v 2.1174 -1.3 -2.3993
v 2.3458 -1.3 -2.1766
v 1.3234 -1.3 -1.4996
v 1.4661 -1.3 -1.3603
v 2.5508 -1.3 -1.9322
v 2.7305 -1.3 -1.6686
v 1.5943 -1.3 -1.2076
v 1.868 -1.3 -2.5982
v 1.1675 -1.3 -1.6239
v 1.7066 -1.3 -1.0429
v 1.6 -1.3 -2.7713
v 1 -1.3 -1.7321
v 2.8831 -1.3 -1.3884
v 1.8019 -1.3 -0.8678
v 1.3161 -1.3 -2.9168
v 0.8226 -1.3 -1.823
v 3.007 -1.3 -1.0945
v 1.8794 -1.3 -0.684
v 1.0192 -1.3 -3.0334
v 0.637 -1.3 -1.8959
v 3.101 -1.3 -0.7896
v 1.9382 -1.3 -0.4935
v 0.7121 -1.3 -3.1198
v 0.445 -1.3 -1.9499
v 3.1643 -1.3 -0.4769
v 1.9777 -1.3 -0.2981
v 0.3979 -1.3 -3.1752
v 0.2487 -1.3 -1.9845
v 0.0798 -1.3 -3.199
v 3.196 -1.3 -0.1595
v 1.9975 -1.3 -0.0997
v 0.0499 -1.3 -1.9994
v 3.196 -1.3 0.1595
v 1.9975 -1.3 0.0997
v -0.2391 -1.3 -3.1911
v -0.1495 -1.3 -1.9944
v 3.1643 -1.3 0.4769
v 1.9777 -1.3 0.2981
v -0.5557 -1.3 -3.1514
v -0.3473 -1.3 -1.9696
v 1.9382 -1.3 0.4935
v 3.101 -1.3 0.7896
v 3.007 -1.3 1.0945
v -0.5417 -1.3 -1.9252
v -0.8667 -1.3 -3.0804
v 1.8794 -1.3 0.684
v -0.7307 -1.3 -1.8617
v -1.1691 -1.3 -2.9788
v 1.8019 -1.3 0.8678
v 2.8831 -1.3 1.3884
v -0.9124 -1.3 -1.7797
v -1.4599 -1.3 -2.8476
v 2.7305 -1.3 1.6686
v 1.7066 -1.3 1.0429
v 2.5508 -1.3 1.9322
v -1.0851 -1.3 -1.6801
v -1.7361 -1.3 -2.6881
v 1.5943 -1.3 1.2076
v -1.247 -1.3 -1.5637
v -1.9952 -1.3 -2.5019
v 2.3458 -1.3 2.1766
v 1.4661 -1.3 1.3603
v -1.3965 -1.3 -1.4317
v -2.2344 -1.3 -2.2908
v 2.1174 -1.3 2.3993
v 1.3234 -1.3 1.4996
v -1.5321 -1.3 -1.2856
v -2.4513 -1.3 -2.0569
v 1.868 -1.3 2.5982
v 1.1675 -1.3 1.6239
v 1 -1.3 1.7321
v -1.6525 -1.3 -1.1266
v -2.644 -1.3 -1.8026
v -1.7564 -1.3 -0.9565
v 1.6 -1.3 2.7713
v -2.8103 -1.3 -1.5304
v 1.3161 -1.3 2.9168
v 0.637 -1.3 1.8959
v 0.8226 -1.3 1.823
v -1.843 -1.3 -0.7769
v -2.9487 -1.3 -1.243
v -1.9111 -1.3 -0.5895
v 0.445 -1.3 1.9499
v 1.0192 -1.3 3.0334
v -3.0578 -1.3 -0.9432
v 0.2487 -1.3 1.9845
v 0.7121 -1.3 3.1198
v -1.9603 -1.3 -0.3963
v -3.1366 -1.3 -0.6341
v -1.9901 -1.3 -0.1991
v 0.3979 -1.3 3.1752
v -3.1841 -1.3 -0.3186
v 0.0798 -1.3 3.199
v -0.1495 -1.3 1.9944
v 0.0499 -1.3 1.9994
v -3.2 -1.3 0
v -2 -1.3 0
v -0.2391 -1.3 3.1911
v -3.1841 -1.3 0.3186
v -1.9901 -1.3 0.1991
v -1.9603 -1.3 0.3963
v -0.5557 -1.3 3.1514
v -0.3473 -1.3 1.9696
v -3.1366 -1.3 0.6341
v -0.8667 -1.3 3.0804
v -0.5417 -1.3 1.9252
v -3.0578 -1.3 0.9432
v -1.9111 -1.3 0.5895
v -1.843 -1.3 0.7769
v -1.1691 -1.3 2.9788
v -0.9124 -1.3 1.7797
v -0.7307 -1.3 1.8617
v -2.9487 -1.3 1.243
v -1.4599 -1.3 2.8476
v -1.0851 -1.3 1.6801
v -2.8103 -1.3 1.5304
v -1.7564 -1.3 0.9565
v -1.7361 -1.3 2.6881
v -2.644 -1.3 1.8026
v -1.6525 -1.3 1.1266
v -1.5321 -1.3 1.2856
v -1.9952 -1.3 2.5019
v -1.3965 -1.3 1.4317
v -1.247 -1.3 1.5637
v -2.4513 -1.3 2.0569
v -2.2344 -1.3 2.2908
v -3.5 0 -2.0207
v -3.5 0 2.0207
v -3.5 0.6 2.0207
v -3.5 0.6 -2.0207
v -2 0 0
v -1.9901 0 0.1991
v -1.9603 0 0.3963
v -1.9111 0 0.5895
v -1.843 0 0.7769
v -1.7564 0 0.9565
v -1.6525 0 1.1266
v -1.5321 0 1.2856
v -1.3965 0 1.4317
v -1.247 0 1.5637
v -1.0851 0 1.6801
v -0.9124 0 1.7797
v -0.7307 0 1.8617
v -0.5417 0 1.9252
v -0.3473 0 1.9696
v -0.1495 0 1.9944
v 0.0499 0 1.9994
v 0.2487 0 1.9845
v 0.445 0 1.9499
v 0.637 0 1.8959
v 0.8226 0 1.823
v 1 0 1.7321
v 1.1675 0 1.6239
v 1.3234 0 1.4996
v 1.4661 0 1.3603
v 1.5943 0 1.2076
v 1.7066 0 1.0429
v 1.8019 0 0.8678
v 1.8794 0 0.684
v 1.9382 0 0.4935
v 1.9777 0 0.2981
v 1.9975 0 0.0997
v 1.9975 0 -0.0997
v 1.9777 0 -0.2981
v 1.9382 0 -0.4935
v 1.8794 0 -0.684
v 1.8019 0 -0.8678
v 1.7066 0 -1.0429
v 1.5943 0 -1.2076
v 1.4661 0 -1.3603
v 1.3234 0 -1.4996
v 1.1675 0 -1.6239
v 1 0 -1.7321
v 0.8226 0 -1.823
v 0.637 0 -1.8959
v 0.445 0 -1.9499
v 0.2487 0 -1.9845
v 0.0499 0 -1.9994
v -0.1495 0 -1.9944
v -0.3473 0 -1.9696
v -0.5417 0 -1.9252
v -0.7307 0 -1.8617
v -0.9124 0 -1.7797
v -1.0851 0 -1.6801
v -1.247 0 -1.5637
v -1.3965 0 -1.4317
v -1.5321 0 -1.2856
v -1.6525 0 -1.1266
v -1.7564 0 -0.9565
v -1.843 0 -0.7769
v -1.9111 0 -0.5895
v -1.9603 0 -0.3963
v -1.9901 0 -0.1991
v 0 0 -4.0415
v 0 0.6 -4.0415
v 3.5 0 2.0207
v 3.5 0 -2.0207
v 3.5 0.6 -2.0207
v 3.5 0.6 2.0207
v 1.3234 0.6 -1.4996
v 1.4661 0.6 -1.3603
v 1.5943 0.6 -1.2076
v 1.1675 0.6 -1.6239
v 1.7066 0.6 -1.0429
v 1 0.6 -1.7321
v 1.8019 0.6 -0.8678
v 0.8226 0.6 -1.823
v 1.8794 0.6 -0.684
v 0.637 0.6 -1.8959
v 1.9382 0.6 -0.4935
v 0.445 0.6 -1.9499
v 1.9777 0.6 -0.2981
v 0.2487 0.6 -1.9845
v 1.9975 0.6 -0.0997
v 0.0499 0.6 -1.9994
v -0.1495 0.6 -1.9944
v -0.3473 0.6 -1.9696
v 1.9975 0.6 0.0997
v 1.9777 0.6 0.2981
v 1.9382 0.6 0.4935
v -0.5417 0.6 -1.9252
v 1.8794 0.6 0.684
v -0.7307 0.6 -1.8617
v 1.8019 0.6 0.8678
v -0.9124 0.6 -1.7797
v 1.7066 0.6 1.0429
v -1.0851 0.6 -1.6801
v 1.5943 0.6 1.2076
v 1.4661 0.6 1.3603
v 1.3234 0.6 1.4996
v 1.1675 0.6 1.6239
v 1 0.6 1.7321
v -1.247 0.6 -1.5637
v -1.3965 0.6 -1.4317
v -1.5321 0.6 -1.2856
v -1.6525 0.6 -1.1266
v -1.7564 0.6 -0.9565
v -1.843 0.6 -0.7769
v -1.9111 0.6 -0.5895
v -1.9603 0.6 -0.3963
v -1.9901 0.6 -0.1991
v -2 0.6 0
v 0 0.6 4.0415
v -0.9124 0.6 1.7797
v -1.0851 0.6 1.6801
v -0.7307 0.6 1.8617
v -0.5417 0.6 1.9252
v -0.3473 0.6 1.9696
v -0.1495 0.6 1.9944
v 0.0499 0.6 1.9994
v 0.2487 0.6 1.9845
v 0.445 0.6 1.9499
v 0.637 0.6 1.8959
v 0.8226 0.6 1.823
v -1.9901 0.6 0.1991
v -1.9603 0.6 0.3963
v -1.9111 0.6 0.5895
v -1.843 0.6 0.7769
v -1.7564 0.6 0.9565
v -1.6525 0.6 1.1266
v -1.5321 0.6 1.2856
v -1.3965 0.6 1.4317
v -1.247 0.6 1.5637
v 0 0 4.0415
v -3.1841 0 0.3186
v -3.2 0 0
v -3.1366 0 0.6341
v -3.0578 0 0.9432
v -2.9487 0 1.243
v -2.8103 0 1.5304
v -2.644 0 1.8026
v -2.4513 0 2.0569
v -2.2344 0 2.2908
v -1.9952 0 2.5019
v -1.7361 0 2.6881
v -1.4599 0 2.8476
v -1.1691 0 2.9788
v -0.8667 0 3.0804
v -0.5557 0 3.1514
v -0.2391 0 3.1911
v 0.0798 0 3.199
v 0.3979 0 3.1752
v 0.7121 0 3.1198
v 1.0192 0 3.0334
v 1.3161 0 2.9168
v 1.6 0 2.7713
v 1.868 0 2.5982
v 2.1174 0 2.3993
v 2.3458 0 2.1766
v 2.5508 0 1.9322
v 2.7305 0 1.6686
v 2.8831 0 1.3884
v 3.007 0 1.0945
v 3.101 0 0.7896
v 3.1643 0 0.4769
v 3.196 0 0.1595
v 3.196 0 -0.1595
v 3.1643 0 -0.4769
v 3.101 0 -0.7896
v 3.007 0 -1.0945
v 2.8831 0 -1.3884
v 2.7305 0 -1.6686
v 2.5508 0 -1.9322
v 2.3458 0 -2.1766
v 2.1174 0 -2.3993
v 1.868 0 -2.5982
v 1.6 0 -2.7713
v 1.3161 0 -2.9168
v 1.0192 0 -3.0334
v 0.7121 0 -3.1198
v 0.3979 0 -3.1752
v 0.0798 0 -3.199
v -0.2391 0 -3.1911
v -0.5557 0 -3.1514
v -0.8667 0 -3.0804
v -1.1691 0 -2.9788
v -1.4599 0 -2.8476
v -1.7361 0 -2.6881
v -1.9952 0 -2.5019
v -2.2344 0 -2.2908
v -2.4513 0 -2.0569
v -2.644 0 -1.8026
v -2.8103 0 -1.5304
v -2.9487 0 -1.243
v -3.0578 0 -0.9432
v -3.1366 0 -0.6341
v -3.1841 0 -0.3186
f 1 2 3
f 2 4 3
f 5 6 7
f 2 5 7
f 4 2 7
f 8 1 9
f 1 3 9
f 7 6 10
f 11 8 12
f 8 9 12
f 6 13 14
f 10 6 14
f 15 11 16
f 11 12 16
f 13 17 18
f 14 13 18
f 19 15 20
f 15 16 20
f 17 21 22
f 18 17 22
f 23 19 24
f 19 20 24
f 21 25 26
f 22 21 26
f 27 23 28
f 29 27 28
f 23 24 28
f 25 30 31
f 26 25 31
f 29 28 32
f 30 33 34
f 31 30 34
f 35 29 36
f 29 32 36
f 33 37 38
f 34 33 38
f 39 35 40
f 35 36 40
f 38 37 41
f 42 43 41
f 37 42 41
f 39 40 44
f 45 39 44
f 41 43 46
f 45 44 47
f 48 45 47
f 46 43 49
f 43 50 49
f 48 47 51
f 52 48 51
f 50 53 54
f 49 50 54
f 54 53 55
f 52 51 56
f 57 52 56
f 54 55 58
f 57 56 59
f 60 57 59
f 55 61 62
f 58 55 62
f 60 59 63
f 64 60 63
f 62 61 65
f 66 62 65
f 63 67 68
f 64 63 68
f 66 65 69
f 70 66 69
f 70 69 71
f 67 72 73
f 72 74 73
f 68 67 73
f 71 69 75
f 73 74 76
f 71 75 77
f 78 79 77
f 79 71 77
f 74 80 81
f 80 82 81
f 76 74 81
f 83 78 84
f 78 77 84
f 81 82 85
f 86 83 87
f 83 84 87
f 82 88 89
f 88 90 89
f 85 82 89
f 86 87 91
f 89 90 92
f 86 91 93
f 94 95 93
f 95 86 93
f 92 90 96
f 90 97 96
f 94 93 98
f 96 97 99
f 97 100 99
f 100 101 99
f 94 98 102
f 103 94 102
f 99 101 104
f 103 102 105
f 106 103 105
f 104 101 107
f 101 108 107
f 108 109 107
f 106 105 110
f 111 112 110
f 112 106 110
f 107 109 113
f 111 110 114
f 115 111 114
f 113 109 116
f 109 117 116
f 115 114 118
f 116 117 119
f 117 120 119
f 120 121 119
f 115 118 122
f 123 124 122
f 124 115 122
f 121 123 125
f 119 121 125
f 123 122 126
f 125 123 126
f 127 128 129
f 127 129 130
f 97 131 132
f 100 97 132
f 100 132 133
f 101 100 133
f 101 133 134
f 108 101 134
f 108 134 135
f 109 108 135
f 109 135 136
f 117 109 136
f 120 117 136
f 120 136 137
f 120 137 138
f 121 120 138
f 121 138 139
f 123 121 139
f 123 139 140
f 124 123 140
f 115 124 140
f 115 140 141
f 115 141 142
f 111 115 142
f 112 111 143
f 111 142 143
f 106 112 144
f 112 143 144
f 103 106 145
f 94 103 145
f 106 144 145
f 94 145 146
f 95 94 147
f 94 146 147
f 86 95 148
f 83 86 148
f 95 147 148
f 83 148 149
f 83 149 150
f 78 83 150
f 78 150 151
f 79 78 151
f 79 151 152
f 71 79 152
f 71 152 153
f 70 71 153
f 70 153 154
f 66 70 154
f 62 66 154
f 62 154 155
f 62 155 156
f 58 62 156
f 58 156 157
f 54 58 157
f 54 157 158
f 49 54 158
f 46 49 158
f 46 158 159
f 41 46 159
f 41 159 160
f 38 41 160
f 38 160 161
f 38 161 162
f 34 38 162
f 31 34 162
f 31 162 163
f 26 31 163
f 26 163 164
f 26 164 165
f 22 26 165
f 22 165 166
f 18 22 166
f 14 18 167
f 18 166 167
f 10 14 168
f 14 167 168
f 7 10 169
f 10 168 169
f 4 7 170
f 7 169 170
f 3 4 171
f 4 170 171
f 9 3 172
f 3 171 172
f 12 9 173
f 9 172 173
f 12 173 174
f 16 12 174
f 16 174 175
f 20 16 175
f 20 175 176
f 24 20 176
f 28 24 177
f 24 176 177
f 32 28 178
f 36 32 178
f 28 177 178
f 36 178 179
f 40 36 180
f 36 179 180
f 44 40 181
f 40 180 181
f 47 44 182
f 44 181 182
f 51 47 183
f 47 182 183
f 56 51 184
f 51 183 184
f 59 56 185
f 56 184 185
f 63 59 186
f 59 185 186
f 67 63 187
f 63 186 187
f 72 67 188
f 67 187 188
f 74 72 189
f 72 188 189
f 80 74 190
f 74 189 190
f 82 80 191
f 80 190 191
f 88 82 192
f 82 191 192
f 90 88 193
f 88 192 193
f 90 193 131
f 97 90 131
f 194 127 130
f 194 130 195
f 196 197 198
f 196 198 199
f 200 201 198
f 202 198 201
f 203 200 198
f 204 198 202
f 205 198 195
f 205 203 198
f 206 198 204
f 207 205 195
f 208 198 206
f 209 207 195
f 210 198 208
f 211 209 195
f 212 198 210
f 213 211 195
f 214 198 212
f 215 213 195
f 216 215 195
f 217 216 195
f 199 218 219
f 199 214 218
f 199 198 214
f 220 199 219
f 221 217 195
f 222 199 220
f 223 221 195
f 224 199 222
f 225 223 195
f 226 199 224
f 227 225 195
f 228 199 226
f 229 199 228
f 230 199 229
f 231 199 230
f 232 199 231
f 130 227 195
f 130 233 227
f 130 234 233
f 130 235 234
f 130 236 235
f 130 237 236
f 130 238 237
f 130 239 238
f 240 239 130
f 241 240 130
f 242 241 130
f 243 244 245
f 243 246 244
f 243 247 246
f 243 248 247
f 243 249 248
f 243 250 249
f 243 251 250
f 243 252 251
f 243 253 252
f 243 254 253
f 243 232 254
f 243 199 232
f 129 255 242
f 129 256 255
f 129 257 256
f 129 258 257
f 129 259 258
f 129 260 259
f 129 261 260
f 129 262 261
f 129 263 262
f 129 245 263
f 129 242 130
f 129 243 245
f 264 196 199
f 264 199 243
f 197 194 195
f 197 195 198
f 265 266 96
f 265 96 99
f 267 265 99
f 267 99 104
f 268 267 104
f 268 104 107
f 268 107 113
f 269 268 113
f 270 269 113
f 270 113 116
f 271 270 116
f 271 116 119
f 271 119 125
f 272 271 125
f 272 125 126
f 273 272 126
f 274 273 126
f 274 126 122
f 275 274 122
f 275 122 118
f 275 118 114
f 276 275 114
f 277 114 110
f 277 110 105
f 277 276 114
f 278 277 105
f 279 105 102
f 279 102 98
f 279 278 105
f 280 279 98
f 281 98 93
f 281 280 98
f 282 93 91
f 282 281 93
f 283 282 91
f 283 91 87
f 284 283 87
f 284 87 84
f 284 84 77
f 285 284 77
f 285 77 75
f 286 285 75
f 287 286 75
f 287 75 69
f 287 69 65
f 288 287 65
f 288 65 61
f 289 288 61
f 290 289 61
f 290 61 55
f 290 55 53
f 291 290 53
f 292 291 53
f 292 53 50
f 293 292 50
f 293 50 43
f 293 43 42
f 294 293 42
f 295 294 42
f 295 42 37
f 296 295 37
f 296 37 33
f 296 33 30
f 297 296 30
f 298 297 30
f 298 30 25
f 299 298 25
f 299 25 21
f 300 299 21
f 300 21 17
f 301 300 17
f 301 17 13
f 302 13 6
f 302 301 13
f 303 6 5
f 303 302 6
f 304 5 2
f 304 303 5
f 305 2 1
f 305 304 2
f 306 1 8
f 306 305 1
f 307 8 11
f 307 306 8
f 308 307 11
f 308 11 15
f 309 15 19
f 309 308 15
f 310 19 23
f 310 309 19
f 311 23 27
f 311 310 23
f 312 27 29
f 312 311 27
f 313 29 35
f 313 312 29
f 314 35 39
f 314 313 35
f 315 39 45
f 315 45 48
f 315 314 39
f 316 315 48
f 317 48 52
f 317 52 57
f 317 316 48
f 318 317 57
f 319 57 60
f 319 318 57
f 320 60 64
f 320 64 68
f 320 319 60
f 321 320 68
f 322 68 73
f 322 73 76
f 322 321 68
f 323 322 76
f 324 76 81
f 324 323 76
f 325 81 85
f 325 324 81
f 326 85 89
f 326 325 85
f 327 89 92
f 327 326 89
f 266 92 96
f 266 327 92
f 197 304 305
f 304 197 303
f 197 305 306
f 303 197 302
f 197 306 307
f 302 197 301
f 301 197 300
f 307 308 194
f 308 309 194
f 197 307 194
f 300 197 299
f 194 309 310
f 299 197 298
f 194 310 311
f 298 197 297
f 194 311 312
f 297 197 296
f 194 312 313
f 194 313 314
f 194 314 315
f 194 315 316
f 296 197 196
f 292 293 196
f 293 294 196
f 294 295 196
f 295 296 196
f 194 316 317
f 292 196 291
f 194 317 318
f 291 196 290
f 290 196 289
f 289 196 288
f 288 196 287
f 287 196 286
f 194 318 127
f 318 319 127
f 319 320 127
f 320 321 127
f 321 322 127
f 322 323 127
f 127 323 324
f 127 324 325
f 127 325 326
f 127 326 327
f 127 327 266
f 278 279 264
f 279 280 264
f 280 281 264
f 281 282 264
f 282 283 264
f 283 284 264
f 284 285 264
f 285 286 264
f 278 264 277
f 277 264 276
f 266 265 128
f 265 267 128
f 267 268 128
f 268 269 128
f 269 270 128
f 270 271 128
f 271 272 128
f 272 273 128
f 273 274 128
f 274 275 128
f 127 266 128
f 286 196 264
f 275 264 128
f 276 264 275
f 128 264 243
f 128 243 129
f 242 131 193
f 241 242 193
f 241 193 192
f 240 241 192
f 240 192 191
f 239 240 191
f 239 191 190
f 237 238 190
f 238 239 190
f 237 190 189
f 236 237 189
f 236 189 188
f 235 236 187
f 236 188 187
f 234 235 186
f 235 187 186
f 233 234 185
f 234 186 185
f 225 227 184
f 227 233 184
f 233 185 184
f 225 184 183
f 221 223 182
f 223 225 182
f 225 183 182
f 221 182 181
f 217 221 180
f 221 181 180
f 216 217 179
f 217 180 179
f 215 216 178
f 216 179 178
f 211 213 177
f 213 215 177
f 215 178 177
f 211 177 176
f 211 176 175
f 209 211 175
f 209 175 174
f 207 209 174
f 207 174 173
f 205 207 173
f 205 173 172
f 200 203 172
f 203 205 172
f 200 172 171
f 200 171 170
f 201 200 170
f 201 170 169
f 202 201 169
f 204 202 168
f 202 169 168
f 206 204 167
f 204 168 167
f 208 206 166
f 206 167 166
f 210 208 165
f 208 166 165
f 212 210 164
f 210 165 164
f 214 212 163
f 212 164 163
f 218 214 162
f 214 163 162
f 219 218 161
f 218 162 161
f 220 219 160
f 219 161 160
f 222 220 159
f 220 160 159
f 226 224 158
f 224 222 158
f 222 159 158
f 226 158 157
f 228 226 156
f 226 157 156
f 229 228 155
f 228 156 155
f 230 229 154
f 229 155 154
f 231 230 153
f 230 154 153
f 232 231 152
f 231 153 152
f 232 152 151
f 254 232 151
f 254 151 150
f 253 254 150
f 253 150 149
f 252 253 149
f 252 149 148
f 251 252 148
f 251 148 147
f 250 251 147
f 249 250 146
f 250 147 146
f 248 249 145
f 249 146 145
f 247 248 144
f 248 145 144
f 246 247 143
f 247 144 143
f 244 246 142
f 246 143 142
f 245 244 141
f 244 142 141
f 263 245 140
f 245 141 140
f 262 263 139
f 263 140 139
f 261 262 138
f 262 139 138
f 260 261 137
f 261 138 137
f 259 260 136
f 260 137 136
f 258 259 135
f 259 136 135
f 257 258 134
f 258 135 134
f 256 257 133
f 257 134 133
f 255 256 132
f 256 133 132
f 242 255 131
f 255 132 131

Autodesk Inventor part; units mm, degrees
ref_plane "YZ Plane" through (0, 0, 0) normal (1, 0, 0) x (0, 1, 0)
ref_plane "XZ Plane" through (0, 0, 0) normal (0, 1, 0) x (-1, 0, 0)
ref_plane "XY Plane" through (0, 0, 0) normal (0, 0, 1) x (1, 0, 0)
sketch "スケッチ1" plane through (0, 0, 0) normal (0, 1, 0) x (-1, 0, 0)
  circle A0 centre (0, 0) radius 2
  circle A1 centre (0, 0) radius 3.2
  circle A2 centre (0, 0) radius 3.5 construction
  line L0 (3.5, 2.0207) -> (3.5, -2.0207)
  line L1 (3.5, -2.0207) -> (0, -4.0415)
  line L2 (0, -4.0415) -> (-3.5, -2.0207)
  line L3 (-3.5, -2.0207) -> (-3.5, 2.0207)
  line L4 (-3.5, 2.0207) -> (0, 4.0415)
  line L5 (0, 4.0415) -> (3.5, 2.0207)
  line L6 (0, 4.5564) -> (0, -4.4801) construction
  line L7 (3.3581, 0) -> (-3.3581, 0) construction
  point P0 (1.75, 3.0311)
  dimension "d2" = 7
  dimension "d0" = 6.4
  dimension "d1" = 4
extrude "押し出し1" add sketch "スケッチ1" along normal blind 0.6 contours A1 | L0 L1 L2 L3 L4 L5
extrude "押し出し2" add sketch "スケッチ1" against normal blind 1.3 contours A1
thread "ねじ1" size "M4x0.7" class "6H" standard "ANSI Metric M Profile" full length
properties part number "SF419" material "鉄、ダクタイル鋳鉄"
